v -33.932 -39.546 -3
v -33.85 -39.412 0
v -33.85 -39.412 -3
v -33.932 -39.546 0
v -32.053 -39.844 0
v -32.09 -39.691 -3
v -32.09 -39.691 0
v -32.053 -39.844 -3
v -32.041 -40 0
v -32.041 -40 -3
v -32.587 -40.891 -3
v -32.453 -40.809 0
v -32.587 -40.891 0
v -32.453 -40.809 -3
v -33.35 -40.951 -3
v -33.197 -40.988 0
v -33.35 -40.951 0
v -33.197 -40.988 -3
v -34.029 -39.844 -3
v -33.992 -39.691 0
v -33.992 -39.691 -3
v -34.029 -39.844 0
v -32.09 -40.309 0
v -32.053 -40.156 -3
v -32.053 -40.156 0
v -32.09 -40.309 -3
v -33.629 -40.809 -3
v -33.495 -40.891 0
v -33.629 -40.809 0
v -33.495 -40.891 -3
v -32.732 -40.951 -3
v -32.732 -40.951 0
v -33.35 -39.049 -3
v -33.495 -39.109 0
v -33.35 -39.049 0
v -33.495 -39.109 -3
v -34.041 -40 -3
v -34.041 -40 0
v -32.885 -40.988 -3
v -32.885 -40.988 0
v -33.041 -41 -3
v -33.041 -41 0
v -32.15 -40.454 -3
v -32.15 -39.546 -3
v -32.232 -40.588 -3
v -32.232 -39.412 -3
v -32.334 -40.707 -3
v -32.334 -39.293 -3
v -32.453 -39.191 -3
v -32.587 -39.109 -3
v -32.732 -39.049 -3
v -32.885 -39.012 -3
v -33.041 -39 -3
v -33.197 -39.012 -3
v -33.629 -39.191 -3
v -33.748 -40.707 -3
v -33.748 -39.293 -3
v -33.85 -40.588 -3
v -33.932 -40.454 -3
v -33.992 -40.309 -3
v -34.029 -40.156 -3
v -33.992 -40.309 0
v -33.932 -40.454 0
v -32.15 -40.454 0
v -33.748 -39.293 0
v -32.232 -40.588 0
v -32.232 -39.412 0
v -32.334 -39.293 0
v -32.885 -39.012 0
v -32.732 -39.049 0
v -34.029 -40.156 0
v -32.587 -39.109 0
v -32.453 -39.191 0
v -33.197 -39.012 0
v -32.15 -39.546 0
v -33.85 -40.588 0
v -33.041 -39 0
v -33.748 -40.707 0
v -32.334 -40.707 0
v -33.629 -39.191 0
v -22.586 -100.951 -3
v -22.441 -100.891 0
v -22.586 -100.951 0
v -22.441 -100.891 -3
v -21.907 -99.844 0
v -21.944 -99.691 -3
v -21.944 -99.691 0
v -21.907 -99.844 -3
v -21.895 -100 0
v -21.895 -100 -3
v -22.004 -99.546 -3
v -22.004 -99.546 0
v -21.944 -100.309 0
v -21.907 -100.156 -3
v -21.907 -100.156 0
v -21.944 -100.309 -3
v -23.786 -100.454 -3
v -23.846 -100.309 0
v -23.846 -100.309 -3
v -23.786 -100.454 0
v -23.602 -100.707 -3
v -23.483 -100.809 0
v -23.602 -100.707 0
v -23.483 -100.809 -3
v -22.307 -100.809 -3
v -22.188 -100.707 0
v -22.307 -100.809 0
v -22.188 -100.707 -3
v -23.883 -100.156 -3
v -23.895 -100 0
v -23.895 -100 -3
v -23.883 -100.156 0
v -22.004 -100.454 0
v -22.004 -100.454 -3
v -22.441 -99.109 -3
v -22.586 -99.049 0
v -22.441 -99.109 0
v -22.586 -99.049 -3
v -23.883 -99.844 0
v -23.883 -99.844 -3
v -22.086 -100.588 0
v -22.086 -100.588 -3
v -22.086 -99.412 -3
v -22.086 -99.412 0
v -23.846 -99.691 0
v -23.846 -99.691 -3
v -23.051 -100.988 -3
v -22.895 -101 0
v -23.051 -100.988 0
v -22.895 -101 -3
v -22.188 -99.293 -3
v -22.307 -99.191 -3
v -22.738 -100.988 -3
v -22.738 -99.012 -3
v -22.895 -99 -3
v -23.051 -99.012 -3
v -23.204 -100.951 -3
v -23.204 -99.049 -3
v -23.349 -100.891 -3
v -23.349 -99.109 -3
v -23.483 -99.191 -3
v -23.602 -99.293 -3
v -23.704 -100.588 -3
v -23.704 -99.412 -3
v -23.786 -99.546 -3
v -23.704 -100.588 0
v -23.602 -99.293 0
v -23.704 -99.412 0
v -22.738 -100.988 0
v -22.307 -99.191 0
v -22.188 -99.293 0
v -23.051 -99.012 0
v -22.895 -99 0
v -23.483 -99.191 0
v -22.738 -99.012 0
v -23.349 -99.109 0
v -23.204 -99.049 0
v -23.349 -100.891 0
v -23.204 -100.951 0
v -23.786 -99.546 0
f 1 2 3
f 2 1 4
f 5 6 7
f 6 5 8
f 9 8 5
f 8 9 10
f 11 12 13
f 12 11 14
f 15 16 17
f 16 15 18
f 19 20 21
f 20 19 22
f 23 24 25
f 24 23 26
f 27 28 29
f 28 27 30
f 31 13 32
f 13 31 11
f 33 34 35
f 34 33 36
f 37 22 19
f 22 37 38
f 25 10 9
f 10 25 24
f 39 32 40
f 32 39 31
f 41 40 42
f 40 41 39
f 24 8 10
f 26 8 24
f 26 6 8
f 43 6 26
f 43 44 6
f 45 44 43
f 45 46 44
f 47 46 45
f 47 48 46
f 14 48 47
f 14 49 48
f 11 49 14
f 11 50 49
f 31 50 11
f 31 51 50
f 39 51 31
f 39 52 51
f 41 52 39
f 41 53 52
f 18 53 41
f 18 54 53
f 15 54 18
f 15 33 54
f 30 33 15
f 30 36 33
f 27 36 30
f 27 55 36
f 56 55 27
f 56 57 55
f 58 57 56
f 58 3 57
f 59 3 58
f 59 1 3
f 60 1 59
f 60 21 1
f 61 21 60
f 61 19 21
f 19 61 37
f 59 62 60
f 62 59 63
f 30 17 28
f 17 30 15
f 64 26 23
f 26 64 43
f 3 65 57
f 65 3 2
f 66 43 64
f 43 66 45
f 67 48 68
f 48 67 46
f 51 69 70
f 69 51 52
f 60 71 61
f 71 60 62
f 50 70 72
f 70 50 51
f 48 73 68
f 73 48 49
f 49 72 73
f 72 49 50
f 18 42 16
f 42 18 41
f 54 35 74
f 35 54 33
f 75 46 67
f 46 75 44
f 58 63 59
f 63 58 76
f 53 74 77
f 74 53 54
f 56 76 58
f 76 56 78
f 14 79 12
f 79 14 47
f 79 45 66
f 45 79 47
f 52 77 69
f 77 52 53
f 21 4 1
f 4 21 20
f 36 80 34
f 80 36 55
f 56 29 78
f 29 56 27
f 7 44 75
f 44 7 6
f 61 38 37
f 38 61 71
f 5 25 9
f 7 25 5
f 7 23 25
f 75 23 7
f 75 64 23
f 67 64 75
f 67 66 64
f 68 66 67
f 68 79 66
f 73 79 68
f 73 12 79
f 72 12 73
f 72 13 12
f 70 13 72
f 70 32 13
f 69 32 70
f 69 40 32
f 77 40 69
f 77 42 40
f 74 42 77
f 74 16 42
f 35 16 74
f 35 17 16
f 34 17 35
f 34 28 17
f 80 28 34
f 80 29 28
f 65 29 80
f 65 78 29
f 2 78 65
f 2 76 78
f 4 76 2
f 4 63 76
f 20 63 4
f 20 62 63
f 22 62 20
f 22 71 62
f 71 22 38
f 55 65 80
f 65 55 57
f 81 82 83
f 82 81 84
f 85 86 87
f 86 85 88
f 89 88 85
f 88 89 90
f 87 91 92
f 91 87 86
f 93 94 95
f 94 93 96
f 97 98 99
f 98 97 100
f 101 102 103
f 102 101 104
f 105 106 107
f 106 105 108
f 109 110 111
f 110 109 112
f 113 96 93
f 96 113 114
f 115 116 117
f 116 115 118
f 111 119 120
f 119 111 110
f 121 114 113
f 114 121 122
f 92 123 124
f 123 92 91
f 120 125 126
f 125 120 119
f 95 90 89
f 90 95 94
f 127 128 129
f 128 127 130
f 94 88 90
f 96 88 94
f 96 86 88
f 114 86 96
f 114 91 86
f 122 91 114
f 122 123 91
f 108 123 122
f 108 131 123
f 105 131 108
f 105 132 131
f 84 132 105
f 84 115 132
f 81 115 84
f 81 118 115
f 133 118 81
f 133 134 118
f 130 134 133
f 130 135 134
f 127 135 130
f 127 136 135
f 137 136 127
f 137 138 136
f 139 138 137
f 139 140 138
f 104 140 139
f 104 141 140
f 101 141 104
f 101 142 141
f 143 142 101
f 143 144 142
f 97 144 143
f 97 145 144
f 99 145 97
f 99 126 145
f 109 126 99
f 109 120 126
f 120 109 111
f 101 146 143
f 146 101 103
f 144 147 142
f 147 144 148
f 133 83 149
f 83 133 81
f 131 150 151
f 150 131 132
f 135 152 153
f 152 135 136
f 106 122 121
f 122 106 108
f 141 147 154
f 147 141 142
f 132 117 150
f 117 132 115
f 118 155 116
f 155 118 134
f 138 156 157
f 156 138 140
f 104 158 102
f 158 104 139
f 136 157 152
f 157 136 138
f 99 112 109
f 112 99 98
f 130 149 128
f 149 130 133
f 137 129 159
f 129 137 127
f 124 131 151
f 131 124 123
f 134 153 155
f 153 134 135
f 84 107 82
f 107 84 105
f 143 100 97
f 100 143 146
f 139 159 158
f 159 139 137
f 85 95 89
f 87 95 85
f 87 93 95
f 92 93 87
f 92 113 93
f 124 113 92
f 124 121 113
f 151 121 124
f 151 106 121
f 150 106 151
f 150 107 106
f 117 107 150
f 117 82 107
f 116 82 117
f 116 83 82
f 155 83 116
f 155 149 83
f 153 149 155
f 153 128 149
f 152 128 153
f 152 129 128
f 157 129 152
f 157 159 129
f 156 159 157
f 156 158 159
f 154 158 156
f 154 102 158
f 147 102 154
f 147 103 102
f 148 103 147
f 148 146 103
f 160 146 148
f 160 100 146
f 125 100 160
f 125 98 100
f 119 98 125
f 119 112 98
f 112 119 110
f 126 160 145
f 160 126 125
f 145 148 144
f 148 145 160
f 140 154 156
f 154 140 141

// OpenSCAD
// file: RotPara.scad
// Rotations Paraboloid
// Grundform. Dieses Skript stellt nur das rot_para() Modul bereit.
// Es wird in den anderen RotPara* Skripten genutzt.
// 
// Copyright, CC-BY-NC-SA, 2020, Mathias Moog, 
// mathias.moog@hs-ansbach.de, Hochschule Ansbach, Deutschland, 
//
// Dieses Produkt steht unter der Creative-Commons-Lizenz 
// Namensnennung - Nicht-kommerziell - 
// Weitergabe unter gleichen Bedingungen 4.0 International. 
// Um eine Kopie dieser Lizenz zu sehen, besuchen Sie
// http://creativecommons.org/licenses/by-nc-sa/4.0/


// Einstellungen aus Octave
// todo, wie für Sattel* von Octave schreiben lassen und hier importieren
r=4;    // Radius in cm
d=0.2;  // Skalierungsfaktor für die Oberflächenpunkte
h=25;   // Höhe des Scheitelpunktes

// Erzeuge aus den Oberflächen RotPara?.dat einen Rotationsparaboloiden.
// Zentriert in x,y, beginnt mit z=0
module rot_para() {
  intersection() {    
    scale([d*10,d*10,10]) {
      translate([0,0,-(h-r*r)]){
        difference(){
          surface(file = "RotParaO.dat", center = true);
          surface(file = "RotParaU.dat", center = true);
        }
      }
    }
    cylinder(r=10*(r+2*d),h=10*r*r);
  }
}
// main file
// Liegender halber Rotations Paraboloid.
// Für den 3D Druck. Die Obere Fläche entspricht einem Paraboloiden.
// Zwei dieser halben können aneinander gesteckt werden.
// 
// Copyright, CC-BY-NC-SA, 2020, Mathias Moog, 
// mathias.moog@hs-ansbach.de, Hochschule Ansbach, Deutschland, 
//
// Dieses Produkt steht unter der Creative-Commons-Lizenz 
// Namensnennung - Nicht-kommerziell - 
// Weitergabe unter gleichen Bedingungen 4.0 International. 
// Um eine Kopie dieser Lizenz zu sehen, besuchen Sie
// http://creativecommons.org/licenses/by-nc-sa/4.0/

// Lade die Grundform
include<RotPara.scad>;

/* Zwei Hälften können mit den Nasen - und den Nasenlöchern - 
   aneinander gesteckt werden.
*/
nase_r=1;   // Radius der Nase
nase_l=3;   // Länge der Nase

$fn=40;     // Damit es hübscher wird. 

/* Schneide den Rotationsparaboliden in der Mitte durch und lege ihn
   um. Schneide anschließend die Nasenlöcher aus
 */
module halber()  {
  difference() {
    // Halbiere Rotationsparboloid und lege um
    rotate([90,0,0]){
      intersection() {
        rot_para();
        translate([-10*(r+d),0,0]){
          cube([20*(r+d),20*(r+d),10*(r+d)*(r+d)]);
        }
      }
    }
    // Nasenlöcher, x>0
    for(y=[4,10]){
      translate([10*sqrt(r*r-y)-1.6*nase_r,-10*y,-nase_l/2]){ 
        cylinder(r=nase_r*1.2,h=nase_l*1.6);
      }
    }
  }

  // Nasen, x<0
  for(y=[4,10]){
    translate([-10*sqrt(r*r-y)+1.6*nase_r,-10*y,-nase_l]){ 
      cylinder(r=nase_r,h=nase_l);
    }
  }
} // Ende halber()

// Zwei halbe ergeben einen ganzen.
halber();
 
